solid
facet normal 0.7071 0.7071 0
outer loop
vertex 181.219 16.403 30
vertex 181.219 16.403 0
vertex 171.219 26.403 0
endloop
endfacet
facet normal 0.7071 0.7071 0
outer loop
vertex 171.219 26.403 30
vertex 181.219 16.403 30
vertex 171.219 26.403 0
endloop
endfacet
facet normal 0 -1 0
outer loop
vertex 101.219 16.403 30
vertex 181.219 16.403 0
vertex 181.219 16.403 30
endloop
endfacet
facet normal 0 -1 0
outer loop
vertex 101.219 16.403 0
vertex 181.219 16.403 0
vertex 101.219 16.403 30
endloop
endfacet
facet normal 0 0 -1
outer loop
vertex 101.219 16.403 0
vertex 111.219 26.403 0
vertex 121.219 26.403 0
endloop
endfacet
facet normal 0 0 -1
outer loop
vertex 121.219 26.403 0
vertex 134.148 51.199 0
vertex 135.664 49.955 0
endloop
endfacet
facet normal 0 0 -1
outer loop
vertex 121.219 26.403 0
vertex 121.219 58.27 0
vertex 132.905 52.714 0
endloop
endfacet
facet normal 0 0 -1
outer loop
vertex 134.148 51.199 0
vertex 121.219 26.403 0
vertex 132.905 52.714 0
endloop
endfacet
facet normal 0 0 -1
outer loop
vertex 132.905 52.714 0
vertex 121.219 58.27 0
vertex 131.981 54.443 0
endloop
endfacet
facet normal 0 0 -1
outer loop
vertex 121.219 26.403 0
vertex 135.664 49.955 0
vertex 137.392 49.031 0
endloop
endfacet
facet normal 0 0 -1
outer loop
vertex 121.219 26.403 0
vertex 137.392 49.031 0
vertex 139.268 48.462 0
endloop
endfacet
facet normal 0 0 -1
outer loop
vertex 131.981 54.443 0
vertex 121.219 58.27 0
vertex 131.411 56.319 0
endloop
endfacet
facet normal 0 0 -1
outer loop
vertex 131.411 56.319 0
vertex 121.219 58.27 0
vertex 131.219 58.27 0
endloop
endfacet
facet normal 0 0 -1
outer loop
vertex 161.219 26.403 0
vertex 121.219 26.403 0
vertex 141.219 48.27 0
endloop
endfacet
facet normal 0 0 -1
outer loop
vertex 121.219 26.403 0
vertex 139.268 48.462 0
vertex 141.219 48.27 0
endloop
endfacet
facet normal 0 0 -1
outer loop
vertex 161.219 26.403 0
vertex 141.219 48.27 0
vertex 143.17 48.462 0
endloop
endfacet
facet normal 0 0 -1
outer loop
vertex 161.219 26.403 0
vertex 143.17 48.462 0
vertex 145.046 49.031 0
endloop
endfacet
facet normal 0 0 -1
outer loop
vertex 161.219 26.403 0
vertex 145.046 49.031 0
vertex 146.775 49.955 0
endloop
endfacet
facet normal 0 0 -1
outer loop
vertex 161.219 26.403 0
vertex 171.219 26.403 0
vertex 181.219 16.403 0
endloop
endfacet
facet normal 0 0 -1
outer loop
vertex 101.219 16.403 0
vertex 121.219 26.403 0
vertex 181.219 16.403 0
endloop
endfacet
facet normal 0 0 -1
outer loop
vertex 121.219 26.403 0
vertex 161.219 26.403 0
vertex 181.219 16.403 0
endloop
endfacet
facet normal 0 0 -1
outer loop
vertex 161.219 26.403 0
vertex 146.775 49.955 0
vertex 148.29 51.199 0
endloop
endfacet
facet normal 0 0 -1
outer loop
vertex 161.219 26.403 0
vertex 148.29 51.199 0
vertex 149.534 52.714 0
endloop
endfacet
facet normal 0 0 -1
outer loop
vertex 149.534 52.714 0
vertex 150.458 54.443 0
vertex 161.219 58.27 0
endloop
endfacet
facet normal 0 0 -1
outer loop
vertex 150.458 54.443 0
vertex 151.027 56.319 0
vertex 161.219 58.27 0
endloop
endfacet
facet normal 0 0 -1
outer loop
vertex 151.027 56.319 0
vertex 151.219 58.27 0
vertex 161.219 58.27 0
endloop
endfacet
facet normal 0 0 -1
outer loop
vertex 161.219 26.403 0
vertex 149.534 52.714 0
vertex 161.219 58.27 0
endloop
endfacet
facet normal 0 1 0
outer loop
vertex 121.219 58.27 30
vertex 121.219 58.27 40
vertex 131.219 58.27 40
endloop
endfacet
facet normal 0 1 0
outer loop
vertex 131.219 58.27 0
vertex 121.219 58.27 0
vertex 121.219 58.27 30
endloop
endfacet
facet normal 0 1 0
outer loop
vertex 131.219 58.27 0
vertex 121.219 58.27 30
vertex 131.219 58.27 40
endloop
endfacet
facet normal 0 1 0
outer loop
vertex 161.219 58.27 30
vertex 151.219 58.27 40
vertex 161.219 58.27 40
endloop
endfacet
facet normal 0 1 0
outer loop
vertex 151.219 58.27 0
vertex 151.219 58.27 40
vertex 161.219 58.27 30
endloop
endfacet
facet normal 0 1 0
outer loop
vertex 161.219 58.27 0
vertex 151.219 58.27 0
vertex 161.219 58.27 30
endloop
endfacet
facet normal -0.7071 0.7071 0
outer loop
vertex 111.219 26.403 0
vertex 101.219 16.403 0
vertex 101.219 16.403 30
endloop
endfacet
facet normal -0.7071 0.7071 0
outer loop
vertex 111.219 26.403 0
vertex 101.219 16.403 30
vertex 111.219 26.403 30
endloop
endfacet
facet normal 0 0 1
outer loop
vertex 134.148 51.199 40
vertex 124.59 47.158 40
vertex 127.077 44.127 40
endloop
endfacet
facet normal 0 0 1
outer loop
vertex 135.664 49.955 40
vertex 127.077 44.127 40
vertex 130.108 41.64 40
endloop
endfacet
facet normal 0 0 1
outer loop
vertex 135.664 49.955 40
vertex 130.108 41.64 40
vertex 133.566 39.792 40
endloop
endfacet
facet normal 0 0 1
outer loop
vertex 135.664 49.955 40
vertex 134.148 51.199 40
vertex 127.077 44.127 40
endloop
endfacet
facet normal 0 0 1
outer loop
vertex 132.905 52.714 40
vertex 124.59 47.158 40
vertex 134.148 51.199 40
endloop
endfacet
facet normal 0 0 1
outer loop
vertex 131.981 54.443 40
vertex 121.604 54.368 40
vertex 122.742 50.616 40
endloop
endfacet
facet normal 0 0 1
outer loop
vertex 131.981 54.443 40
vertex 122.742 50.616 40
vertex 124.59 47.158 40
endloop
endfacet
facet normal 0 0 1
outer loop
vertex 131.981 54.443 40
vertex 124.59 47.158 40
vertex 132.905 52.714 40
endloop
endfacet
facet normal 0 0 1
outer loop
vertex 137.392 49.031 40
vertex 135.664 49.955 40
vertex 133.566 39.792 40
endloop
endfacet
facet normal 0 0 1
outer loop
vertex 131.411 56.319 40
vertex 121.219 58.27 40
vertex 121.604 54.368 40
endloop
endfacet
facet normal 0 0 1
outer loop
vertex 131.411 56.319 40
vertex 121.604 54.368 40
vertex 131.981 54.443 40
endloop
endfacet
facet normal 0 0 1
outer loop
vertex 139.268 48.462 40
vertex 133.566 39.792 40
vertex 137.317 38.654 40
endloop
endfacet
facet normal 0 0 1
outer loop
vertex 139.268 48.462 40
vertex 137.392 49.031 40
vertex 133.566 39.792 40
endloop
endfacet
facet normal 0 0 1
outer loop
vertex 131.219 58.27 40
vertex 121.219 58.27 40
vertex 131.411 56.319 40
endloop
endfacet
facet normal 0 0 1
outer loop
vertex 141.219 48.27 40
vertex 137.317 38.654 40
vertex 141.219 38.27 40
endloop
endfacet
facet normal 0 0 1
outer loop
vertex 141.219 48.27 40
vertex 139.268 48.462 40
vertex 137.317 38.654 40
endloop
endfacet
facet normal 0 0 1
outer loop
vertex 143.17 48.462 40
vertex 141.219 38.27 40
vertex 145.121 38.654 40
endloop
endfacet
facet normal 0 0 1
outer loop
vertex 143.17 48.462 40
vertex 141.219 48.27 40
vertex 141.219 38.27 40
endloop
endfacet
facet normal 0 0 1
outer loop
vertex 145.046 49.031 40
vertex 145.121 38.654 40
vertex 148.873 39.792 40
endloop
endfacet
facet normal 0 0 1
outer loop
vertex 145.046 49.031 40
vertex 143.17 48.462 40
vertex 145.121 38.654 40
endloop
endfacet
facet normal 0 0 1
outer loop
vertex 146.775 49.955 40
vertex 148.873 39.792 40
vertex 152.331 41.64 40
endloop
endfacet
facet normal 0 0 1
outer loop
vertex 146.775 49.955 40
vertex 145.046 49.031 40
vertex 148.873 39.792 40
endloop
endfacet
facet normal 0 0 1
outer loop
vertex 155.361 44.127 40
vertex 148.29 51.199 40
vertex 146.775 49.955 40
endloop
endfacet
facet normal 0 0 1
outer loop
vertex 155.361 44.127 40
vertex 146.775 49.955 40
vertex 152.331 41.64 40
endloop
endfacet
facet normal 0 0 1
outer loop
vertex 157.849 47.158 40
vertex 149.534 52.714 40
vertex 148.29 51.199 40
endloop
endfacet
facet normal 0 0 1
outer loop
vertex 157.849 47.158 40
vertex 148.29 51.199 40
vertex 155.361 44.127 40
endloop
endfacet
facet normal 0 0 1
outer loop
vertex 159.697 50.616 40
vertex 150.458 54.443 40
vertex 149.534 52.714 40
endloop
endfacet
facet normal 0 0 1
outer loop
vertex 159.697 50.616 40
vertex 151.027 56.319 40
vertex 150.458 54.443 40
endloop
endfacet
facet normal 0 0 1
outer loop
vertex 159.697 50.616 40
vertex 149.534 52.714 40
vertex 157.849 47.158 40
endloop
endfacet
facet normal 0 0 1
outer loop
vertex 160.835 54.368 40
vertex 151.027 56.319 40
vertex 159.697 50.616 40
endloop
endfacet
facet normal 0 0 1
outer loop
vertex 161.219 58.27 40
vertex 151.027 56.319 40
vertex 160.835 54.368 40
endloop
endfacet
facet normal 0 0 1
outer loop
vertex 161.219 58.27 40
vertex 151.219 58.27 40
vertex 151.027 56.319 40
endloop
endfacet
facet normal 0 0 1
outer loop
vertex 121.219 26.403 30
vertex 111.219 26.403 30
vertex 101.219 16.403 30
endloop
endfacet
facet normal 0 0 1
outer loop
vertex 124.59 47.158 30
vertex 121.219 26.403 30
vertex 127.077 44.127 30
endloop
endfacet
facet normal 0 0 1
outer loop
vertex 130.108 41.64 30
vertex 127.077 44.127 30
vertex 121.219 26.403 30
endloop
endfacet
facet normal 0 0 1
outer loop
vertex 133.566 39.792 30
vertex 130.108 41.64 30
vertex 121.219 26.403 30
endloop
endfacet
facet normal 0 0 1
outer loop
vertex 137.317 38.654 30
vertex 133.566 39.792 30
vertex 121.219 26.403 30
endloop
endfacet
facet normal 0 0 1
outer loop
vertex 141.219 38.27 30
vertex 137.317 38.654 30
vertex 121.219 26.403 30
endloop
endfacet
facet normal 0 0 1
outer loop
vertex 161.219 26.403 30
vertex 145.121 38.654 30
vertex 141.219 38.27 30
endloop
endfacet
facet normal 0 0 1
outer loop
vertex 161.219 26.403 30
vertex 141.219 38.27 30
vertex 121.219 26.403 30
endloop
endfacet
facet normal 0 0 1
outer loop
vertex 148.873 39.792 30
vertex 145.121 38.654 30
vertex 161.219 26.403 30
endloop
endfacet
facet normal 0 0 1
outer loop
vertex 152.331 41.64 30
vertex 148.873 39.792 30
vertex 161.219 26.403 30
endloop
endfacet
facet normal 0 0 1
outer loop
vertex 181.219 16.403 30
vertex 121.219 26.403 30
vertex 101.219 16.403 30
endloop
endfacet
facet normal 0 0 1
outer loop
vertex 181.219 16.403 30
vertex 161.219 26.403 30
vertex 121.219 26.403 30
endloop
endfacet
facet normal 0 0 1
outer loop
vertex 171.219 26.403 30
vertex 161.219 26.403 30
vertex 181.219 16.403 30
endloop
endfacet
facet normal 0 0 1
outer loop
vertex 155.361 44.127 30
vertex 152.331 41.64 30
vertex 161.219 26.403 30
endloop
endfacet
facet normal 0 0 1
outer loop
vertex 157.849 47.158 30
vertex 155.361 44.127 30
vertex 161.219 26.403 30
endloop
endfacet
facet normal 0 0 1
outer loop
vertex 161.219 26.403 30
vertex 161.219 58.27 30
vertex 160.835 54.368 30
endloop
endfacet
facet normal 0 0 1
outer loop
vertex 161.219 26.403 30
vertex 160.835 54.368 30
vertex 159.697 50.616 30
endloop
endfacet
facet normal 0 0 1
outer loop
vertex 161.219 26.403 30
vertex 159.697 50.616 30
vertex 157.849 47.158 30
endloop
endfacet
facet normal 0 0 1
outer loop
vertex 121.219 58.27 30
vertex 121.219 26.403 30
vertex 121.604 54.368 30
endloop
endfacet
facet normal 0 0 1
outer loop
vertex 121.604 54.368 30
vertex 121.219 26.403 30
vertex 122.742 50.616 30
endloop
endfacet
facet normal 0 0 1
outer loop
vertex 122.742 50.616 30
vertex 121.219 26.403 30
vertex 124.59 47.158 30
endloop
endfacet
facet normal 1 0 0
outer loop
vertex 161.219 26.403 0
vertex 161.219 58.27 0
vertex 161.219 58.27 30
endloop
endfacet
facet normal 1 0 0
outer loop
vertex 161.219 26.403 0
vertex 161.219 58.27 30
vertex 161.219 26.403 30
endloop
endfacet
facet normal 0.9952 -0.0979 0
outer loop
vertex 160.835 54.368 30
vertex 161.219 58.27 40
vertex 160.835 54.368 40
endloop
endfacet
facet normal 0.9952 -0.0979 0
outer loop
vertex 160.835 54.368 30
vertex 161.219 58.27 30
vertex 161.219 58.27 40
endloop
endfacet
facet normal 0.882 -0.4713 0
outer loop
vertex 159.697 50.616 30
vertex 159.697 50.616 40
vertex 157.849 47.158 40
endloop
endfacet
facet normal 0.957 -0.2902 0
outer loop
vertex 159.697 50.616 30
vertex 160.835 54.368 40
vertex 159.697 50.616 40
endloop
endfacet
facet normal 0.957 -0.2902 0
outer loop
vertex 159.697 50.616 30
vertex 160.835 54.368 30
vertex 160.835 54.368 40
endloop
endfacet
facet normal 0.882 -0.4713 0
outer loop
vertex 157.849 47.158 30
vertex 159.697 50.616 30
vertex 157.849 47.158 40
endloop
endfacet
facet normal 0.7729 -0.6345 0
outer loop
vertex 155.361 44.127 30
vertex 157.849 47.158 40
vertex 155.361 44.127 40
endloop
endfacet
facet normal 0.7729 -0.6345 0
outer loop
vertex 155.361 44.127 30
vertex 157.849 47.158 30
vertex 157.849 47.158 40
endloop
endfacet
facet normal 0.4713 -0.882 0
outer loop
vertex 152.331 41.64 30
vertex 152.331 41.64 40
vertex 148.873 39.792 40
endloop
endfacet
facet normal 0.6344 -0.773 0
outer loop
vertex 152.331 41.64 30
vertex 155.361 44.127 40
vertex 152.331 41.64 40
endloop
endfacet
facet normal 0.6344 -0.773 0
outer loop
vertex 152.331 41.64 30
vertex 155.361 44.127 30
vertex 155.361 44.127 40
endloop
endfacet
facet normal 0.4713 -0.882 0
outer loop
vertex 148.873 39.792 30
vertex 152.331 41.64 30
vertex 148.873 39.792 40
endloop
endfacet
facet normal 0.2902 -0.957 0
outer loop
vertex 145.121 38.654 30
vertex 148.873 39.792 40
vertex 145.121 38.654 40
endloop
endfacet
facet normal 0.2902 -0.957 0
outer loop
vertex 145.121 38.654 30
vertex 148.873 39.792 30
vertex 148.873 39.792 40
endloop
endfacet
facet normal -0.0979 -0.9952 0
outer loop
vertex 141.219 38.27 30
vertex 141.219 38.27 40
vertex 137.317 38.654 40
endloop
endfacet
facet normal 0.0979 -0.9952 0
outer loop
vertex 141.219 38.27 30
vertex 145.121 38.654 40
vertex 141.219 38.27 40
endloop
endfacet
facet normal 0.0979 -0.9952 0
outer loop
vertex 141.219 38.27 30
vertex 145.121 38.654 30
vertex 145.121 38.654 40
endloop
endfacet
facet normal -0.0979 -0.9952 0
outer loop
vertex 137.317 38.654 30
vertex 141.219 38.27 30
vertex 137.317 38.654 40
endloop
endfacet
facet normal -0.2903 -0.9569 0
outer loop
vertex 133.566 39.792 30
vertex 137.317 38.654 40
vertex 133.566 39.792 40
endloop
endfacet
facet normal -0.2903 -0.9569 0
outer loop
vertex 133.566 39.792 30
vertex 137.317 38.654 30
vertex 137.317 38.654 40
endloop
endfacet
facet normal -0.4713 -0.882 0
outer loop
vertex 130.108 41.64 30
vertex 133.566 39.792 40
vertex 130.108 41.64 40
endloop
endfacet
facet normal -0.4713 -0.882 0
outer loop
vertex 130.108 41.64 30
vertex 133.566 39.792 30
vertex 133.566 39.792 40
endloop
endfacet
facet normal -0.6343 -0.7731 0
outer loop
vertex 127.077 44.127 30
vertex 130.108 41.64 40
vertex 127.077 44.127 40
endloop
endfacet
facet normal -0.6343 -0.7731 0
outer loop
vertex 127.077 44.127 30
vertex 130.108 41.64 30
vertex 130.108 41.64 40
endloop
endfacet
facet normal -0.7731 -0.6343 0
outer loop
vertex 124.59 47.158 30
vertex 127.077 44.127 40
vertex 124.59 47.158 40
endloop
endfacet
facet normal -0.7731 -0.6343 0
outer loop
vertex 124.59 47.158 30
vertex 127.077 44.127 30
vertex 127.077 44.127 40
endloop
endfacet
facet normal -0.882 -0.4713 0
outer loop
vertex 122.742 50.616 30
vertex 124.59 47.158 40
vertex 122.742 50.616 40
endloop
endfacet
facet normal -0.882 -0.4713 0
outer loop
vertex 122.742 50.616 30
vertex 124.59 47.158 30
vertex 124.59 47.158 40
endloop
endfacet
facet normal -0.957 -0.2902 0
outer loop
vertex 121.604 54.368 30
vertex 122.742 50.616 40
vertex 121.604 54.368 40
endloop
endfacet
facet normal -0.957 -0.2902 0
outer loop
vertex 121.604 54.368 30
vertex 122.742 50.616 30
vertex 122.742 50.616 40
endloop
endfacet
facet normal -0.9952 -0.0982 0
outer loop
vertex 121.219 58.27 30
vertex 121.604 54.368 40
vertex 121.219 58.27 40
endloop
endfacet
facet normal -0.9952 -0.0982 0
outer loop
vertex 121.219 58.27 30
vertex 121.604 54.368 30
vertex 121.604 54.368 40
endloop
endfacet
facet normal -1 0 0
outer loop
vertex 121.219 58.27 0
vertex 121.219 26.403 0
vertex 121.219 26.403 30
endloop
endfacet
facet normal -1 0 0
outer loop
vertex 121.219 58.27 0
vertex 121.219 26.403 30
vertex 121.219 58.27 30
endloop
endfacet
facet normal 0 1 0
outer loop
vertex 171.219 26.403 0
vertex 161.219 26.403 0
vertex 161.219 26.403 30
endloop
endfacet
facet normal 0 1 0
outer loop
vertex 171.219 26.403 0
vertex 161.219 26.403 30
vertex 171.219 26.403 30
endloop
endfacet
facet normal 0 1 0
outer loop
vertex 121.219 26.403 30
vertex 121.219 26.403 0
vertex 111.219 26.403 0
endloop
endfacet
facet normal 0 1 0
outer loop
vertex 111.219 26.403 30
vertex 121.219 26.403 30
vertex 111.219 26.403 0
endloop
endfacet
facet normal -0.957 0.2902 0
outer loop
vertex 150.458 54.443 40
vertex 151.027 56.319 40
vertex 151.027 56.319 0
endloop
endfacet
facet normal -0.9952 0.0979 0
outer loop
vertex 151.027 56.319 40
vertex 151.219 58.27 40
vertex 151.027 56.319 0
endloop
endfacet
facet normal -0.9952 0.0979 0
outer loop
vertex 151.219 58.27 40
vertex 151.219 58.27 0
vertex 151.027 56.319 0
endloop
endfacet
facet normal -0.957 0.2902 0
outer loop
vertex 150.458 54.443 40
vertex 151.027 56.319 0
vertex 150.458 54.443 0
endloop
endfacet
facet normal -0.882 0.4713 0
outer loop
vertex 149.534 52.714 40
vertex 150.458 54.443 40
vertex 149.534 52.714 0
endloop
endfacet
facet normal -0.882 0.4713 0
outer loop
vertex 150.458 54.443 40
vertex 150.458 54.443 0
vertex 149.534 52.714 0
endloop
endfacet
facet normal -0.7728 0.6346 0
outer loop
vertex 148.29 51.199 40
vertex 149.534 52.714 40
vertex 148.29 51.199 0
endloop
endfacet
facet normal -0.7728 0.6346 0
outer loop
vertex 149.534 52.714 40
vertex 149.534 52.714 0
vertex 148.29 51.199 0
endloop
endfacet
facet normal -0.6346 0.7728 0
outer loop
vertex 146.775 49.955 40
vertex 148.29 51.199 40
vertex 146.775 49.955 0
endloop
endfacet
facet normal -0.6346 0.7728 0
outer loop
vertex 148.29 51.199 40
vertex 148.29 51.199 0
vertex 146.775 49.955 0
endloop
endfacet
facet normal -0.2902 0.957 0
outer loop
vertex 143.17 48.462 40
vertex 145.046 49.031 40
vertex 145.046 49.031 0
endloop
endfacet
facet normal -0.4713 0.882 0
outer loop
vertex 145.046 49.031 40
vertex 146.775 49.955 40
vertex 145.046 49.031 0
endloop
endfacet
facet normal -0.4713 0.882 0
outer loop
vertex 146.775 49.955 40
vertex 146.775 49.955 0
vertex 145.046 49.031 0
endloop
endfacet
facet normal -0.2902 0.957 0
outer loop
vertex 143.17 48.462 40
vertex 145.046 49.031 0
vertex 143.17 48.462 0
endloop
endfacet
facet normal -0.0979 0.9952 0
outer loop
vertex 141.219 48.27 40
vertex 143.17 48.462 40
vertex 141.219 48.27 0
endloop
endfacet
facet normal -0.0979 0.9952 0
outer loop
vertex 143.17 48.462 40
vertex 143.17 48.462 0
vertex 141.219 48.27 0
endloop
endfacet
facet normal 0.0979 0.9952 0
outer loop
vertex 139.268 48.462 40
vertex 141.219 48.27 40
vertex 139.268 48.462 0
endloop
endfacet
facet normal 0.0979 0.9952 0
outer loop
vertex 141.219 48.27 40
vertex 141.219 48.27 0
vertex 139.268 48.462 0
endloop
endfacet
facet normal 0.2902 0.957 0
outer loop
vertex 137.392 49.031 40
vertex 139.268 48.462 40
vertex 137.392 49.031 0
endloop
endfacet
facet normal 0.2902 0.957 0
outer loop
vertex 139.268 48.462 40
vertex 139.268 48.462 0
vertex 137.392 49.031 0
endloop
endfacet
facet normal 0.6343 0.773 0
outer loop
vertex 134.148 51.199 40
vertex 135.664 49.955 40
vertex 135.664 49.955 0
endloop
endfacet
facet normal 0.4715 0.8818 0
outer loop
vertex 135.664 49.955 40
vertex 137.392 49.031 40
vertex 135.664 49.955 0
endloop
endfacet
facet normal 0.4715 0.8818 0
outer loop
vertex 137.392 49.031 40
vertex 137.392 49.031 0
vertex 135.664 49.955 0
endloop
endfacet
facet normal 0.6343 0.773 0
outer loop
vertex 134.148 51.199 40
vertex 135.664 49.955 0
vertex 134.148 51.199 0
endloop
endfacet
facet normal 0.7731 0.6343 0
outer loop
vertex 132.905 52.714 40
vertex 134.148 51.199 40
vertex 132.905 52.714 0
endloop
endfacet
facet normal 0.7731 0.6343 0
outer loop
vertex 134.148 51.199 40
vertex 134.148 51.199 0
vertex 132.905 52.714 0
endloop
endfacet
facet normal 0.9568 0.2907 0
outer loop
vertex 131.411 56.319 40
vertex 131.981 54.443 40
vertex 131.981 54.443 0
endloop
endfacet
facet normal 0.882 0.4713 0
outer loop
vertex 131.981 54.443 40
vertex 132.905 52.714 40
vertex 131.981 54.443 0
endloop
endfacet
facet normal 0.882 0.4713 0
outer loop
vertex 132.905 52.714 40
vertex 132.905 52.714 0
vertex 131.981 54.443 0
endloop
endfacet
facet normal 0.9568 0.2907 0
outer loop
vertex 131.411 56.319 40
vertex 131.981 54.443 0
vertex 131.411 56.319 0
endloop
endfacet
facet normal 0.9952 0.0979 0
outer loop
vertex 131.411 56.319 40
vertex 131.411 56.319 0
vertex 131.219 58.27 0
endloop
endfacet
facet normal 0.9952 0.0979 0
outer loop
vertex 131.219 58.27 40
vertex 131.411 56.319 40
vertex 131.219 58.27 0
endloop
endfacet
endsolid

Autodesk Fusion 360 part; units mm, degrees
sketch "Sketch1" plane through (0, 0, 0) normal (0, 0, 1) x (1, 0, 0) in component "Component"
sketch "Sketch1 (2)" plane through (0, 0, 0) normal (0, 0, 1) x (1, 0, 0)
sketch "Sketch2" plane through (0, 0, 0) normal (0, 0, 1) x (1, 0, 0) in component "Component"
  arc A0 (17.6425, 34.6248) -> (62.3575, 34.6248) centre (40, 35) ccw
  arc A1 (23.5355, 34.6248) -> (56.4645, 34.6248) centre (40, 36.7106) ccw
  line L0 (17.6425, 34.6248) -> (23.5355, 34.6248)
  line L1 (56.4645, 34.6248) -> (62.3575, 34.6248)
sketch "Sketch2 (2)" plane through (0, 0, 0) normal (0, 0, 1) x (1, 0, 0)
  line L0 (121.2193, 26.4028) -> (121.2193, 28.2696)
  line L1 (121.2193, 28.2696) -> (121.2193, 58.2696)
  line L2 (161.2193, 58.2696) -> (161.2193, 26.4028)
  line L3 (161.2193, 26.4028) -> (171.2193, 26.4028)
  line L4 (181.2193, 16.4028) -> (101.2193, 16.4028)
  line L5 (121.2193, 26.4028) -> (111.2193, 26.4028)
  line L6 (101.2193, 16.4028) -> (111.2193, 26.4028)
  line L7 (181.2193, 16.4028) -> (171.2193, 26.4028)
  arc A0 (131.2193, 58.2696) -> (151.2193, 58.2696) centre (141.2193, 58.2696) ccw
  arc A1 (121.2193, 58.2696) -> (161.2193, 58.2696) centre (141.2193, 58.2696) ccw
  line L8 (121.2193, 58.2696) -> (131.2193, 58.2696)
  line L9 (151.2193, 58.2696) -> (161.2193, 58.2696)
  dimension "d23" = 20
  dimension "d24" = 20
  dimension "d25" = 40
  dimension "d32" = 80
  dimension "d33" = 10
extrude "Extrude1" add sketch "Sketch2 (2)" along normal blind 40 contours A0 A1 L8 L9
extrude "Extrude2" add sketch "Sketch2 (2)" along normal blind 30 contours L0 L1 L2 L3 L4 L5 L6 L7 A1
component "Component" placed x (1, 0, 0) y (0, 1, 0) z (0, 0, 1) at (0, 0, 0)
